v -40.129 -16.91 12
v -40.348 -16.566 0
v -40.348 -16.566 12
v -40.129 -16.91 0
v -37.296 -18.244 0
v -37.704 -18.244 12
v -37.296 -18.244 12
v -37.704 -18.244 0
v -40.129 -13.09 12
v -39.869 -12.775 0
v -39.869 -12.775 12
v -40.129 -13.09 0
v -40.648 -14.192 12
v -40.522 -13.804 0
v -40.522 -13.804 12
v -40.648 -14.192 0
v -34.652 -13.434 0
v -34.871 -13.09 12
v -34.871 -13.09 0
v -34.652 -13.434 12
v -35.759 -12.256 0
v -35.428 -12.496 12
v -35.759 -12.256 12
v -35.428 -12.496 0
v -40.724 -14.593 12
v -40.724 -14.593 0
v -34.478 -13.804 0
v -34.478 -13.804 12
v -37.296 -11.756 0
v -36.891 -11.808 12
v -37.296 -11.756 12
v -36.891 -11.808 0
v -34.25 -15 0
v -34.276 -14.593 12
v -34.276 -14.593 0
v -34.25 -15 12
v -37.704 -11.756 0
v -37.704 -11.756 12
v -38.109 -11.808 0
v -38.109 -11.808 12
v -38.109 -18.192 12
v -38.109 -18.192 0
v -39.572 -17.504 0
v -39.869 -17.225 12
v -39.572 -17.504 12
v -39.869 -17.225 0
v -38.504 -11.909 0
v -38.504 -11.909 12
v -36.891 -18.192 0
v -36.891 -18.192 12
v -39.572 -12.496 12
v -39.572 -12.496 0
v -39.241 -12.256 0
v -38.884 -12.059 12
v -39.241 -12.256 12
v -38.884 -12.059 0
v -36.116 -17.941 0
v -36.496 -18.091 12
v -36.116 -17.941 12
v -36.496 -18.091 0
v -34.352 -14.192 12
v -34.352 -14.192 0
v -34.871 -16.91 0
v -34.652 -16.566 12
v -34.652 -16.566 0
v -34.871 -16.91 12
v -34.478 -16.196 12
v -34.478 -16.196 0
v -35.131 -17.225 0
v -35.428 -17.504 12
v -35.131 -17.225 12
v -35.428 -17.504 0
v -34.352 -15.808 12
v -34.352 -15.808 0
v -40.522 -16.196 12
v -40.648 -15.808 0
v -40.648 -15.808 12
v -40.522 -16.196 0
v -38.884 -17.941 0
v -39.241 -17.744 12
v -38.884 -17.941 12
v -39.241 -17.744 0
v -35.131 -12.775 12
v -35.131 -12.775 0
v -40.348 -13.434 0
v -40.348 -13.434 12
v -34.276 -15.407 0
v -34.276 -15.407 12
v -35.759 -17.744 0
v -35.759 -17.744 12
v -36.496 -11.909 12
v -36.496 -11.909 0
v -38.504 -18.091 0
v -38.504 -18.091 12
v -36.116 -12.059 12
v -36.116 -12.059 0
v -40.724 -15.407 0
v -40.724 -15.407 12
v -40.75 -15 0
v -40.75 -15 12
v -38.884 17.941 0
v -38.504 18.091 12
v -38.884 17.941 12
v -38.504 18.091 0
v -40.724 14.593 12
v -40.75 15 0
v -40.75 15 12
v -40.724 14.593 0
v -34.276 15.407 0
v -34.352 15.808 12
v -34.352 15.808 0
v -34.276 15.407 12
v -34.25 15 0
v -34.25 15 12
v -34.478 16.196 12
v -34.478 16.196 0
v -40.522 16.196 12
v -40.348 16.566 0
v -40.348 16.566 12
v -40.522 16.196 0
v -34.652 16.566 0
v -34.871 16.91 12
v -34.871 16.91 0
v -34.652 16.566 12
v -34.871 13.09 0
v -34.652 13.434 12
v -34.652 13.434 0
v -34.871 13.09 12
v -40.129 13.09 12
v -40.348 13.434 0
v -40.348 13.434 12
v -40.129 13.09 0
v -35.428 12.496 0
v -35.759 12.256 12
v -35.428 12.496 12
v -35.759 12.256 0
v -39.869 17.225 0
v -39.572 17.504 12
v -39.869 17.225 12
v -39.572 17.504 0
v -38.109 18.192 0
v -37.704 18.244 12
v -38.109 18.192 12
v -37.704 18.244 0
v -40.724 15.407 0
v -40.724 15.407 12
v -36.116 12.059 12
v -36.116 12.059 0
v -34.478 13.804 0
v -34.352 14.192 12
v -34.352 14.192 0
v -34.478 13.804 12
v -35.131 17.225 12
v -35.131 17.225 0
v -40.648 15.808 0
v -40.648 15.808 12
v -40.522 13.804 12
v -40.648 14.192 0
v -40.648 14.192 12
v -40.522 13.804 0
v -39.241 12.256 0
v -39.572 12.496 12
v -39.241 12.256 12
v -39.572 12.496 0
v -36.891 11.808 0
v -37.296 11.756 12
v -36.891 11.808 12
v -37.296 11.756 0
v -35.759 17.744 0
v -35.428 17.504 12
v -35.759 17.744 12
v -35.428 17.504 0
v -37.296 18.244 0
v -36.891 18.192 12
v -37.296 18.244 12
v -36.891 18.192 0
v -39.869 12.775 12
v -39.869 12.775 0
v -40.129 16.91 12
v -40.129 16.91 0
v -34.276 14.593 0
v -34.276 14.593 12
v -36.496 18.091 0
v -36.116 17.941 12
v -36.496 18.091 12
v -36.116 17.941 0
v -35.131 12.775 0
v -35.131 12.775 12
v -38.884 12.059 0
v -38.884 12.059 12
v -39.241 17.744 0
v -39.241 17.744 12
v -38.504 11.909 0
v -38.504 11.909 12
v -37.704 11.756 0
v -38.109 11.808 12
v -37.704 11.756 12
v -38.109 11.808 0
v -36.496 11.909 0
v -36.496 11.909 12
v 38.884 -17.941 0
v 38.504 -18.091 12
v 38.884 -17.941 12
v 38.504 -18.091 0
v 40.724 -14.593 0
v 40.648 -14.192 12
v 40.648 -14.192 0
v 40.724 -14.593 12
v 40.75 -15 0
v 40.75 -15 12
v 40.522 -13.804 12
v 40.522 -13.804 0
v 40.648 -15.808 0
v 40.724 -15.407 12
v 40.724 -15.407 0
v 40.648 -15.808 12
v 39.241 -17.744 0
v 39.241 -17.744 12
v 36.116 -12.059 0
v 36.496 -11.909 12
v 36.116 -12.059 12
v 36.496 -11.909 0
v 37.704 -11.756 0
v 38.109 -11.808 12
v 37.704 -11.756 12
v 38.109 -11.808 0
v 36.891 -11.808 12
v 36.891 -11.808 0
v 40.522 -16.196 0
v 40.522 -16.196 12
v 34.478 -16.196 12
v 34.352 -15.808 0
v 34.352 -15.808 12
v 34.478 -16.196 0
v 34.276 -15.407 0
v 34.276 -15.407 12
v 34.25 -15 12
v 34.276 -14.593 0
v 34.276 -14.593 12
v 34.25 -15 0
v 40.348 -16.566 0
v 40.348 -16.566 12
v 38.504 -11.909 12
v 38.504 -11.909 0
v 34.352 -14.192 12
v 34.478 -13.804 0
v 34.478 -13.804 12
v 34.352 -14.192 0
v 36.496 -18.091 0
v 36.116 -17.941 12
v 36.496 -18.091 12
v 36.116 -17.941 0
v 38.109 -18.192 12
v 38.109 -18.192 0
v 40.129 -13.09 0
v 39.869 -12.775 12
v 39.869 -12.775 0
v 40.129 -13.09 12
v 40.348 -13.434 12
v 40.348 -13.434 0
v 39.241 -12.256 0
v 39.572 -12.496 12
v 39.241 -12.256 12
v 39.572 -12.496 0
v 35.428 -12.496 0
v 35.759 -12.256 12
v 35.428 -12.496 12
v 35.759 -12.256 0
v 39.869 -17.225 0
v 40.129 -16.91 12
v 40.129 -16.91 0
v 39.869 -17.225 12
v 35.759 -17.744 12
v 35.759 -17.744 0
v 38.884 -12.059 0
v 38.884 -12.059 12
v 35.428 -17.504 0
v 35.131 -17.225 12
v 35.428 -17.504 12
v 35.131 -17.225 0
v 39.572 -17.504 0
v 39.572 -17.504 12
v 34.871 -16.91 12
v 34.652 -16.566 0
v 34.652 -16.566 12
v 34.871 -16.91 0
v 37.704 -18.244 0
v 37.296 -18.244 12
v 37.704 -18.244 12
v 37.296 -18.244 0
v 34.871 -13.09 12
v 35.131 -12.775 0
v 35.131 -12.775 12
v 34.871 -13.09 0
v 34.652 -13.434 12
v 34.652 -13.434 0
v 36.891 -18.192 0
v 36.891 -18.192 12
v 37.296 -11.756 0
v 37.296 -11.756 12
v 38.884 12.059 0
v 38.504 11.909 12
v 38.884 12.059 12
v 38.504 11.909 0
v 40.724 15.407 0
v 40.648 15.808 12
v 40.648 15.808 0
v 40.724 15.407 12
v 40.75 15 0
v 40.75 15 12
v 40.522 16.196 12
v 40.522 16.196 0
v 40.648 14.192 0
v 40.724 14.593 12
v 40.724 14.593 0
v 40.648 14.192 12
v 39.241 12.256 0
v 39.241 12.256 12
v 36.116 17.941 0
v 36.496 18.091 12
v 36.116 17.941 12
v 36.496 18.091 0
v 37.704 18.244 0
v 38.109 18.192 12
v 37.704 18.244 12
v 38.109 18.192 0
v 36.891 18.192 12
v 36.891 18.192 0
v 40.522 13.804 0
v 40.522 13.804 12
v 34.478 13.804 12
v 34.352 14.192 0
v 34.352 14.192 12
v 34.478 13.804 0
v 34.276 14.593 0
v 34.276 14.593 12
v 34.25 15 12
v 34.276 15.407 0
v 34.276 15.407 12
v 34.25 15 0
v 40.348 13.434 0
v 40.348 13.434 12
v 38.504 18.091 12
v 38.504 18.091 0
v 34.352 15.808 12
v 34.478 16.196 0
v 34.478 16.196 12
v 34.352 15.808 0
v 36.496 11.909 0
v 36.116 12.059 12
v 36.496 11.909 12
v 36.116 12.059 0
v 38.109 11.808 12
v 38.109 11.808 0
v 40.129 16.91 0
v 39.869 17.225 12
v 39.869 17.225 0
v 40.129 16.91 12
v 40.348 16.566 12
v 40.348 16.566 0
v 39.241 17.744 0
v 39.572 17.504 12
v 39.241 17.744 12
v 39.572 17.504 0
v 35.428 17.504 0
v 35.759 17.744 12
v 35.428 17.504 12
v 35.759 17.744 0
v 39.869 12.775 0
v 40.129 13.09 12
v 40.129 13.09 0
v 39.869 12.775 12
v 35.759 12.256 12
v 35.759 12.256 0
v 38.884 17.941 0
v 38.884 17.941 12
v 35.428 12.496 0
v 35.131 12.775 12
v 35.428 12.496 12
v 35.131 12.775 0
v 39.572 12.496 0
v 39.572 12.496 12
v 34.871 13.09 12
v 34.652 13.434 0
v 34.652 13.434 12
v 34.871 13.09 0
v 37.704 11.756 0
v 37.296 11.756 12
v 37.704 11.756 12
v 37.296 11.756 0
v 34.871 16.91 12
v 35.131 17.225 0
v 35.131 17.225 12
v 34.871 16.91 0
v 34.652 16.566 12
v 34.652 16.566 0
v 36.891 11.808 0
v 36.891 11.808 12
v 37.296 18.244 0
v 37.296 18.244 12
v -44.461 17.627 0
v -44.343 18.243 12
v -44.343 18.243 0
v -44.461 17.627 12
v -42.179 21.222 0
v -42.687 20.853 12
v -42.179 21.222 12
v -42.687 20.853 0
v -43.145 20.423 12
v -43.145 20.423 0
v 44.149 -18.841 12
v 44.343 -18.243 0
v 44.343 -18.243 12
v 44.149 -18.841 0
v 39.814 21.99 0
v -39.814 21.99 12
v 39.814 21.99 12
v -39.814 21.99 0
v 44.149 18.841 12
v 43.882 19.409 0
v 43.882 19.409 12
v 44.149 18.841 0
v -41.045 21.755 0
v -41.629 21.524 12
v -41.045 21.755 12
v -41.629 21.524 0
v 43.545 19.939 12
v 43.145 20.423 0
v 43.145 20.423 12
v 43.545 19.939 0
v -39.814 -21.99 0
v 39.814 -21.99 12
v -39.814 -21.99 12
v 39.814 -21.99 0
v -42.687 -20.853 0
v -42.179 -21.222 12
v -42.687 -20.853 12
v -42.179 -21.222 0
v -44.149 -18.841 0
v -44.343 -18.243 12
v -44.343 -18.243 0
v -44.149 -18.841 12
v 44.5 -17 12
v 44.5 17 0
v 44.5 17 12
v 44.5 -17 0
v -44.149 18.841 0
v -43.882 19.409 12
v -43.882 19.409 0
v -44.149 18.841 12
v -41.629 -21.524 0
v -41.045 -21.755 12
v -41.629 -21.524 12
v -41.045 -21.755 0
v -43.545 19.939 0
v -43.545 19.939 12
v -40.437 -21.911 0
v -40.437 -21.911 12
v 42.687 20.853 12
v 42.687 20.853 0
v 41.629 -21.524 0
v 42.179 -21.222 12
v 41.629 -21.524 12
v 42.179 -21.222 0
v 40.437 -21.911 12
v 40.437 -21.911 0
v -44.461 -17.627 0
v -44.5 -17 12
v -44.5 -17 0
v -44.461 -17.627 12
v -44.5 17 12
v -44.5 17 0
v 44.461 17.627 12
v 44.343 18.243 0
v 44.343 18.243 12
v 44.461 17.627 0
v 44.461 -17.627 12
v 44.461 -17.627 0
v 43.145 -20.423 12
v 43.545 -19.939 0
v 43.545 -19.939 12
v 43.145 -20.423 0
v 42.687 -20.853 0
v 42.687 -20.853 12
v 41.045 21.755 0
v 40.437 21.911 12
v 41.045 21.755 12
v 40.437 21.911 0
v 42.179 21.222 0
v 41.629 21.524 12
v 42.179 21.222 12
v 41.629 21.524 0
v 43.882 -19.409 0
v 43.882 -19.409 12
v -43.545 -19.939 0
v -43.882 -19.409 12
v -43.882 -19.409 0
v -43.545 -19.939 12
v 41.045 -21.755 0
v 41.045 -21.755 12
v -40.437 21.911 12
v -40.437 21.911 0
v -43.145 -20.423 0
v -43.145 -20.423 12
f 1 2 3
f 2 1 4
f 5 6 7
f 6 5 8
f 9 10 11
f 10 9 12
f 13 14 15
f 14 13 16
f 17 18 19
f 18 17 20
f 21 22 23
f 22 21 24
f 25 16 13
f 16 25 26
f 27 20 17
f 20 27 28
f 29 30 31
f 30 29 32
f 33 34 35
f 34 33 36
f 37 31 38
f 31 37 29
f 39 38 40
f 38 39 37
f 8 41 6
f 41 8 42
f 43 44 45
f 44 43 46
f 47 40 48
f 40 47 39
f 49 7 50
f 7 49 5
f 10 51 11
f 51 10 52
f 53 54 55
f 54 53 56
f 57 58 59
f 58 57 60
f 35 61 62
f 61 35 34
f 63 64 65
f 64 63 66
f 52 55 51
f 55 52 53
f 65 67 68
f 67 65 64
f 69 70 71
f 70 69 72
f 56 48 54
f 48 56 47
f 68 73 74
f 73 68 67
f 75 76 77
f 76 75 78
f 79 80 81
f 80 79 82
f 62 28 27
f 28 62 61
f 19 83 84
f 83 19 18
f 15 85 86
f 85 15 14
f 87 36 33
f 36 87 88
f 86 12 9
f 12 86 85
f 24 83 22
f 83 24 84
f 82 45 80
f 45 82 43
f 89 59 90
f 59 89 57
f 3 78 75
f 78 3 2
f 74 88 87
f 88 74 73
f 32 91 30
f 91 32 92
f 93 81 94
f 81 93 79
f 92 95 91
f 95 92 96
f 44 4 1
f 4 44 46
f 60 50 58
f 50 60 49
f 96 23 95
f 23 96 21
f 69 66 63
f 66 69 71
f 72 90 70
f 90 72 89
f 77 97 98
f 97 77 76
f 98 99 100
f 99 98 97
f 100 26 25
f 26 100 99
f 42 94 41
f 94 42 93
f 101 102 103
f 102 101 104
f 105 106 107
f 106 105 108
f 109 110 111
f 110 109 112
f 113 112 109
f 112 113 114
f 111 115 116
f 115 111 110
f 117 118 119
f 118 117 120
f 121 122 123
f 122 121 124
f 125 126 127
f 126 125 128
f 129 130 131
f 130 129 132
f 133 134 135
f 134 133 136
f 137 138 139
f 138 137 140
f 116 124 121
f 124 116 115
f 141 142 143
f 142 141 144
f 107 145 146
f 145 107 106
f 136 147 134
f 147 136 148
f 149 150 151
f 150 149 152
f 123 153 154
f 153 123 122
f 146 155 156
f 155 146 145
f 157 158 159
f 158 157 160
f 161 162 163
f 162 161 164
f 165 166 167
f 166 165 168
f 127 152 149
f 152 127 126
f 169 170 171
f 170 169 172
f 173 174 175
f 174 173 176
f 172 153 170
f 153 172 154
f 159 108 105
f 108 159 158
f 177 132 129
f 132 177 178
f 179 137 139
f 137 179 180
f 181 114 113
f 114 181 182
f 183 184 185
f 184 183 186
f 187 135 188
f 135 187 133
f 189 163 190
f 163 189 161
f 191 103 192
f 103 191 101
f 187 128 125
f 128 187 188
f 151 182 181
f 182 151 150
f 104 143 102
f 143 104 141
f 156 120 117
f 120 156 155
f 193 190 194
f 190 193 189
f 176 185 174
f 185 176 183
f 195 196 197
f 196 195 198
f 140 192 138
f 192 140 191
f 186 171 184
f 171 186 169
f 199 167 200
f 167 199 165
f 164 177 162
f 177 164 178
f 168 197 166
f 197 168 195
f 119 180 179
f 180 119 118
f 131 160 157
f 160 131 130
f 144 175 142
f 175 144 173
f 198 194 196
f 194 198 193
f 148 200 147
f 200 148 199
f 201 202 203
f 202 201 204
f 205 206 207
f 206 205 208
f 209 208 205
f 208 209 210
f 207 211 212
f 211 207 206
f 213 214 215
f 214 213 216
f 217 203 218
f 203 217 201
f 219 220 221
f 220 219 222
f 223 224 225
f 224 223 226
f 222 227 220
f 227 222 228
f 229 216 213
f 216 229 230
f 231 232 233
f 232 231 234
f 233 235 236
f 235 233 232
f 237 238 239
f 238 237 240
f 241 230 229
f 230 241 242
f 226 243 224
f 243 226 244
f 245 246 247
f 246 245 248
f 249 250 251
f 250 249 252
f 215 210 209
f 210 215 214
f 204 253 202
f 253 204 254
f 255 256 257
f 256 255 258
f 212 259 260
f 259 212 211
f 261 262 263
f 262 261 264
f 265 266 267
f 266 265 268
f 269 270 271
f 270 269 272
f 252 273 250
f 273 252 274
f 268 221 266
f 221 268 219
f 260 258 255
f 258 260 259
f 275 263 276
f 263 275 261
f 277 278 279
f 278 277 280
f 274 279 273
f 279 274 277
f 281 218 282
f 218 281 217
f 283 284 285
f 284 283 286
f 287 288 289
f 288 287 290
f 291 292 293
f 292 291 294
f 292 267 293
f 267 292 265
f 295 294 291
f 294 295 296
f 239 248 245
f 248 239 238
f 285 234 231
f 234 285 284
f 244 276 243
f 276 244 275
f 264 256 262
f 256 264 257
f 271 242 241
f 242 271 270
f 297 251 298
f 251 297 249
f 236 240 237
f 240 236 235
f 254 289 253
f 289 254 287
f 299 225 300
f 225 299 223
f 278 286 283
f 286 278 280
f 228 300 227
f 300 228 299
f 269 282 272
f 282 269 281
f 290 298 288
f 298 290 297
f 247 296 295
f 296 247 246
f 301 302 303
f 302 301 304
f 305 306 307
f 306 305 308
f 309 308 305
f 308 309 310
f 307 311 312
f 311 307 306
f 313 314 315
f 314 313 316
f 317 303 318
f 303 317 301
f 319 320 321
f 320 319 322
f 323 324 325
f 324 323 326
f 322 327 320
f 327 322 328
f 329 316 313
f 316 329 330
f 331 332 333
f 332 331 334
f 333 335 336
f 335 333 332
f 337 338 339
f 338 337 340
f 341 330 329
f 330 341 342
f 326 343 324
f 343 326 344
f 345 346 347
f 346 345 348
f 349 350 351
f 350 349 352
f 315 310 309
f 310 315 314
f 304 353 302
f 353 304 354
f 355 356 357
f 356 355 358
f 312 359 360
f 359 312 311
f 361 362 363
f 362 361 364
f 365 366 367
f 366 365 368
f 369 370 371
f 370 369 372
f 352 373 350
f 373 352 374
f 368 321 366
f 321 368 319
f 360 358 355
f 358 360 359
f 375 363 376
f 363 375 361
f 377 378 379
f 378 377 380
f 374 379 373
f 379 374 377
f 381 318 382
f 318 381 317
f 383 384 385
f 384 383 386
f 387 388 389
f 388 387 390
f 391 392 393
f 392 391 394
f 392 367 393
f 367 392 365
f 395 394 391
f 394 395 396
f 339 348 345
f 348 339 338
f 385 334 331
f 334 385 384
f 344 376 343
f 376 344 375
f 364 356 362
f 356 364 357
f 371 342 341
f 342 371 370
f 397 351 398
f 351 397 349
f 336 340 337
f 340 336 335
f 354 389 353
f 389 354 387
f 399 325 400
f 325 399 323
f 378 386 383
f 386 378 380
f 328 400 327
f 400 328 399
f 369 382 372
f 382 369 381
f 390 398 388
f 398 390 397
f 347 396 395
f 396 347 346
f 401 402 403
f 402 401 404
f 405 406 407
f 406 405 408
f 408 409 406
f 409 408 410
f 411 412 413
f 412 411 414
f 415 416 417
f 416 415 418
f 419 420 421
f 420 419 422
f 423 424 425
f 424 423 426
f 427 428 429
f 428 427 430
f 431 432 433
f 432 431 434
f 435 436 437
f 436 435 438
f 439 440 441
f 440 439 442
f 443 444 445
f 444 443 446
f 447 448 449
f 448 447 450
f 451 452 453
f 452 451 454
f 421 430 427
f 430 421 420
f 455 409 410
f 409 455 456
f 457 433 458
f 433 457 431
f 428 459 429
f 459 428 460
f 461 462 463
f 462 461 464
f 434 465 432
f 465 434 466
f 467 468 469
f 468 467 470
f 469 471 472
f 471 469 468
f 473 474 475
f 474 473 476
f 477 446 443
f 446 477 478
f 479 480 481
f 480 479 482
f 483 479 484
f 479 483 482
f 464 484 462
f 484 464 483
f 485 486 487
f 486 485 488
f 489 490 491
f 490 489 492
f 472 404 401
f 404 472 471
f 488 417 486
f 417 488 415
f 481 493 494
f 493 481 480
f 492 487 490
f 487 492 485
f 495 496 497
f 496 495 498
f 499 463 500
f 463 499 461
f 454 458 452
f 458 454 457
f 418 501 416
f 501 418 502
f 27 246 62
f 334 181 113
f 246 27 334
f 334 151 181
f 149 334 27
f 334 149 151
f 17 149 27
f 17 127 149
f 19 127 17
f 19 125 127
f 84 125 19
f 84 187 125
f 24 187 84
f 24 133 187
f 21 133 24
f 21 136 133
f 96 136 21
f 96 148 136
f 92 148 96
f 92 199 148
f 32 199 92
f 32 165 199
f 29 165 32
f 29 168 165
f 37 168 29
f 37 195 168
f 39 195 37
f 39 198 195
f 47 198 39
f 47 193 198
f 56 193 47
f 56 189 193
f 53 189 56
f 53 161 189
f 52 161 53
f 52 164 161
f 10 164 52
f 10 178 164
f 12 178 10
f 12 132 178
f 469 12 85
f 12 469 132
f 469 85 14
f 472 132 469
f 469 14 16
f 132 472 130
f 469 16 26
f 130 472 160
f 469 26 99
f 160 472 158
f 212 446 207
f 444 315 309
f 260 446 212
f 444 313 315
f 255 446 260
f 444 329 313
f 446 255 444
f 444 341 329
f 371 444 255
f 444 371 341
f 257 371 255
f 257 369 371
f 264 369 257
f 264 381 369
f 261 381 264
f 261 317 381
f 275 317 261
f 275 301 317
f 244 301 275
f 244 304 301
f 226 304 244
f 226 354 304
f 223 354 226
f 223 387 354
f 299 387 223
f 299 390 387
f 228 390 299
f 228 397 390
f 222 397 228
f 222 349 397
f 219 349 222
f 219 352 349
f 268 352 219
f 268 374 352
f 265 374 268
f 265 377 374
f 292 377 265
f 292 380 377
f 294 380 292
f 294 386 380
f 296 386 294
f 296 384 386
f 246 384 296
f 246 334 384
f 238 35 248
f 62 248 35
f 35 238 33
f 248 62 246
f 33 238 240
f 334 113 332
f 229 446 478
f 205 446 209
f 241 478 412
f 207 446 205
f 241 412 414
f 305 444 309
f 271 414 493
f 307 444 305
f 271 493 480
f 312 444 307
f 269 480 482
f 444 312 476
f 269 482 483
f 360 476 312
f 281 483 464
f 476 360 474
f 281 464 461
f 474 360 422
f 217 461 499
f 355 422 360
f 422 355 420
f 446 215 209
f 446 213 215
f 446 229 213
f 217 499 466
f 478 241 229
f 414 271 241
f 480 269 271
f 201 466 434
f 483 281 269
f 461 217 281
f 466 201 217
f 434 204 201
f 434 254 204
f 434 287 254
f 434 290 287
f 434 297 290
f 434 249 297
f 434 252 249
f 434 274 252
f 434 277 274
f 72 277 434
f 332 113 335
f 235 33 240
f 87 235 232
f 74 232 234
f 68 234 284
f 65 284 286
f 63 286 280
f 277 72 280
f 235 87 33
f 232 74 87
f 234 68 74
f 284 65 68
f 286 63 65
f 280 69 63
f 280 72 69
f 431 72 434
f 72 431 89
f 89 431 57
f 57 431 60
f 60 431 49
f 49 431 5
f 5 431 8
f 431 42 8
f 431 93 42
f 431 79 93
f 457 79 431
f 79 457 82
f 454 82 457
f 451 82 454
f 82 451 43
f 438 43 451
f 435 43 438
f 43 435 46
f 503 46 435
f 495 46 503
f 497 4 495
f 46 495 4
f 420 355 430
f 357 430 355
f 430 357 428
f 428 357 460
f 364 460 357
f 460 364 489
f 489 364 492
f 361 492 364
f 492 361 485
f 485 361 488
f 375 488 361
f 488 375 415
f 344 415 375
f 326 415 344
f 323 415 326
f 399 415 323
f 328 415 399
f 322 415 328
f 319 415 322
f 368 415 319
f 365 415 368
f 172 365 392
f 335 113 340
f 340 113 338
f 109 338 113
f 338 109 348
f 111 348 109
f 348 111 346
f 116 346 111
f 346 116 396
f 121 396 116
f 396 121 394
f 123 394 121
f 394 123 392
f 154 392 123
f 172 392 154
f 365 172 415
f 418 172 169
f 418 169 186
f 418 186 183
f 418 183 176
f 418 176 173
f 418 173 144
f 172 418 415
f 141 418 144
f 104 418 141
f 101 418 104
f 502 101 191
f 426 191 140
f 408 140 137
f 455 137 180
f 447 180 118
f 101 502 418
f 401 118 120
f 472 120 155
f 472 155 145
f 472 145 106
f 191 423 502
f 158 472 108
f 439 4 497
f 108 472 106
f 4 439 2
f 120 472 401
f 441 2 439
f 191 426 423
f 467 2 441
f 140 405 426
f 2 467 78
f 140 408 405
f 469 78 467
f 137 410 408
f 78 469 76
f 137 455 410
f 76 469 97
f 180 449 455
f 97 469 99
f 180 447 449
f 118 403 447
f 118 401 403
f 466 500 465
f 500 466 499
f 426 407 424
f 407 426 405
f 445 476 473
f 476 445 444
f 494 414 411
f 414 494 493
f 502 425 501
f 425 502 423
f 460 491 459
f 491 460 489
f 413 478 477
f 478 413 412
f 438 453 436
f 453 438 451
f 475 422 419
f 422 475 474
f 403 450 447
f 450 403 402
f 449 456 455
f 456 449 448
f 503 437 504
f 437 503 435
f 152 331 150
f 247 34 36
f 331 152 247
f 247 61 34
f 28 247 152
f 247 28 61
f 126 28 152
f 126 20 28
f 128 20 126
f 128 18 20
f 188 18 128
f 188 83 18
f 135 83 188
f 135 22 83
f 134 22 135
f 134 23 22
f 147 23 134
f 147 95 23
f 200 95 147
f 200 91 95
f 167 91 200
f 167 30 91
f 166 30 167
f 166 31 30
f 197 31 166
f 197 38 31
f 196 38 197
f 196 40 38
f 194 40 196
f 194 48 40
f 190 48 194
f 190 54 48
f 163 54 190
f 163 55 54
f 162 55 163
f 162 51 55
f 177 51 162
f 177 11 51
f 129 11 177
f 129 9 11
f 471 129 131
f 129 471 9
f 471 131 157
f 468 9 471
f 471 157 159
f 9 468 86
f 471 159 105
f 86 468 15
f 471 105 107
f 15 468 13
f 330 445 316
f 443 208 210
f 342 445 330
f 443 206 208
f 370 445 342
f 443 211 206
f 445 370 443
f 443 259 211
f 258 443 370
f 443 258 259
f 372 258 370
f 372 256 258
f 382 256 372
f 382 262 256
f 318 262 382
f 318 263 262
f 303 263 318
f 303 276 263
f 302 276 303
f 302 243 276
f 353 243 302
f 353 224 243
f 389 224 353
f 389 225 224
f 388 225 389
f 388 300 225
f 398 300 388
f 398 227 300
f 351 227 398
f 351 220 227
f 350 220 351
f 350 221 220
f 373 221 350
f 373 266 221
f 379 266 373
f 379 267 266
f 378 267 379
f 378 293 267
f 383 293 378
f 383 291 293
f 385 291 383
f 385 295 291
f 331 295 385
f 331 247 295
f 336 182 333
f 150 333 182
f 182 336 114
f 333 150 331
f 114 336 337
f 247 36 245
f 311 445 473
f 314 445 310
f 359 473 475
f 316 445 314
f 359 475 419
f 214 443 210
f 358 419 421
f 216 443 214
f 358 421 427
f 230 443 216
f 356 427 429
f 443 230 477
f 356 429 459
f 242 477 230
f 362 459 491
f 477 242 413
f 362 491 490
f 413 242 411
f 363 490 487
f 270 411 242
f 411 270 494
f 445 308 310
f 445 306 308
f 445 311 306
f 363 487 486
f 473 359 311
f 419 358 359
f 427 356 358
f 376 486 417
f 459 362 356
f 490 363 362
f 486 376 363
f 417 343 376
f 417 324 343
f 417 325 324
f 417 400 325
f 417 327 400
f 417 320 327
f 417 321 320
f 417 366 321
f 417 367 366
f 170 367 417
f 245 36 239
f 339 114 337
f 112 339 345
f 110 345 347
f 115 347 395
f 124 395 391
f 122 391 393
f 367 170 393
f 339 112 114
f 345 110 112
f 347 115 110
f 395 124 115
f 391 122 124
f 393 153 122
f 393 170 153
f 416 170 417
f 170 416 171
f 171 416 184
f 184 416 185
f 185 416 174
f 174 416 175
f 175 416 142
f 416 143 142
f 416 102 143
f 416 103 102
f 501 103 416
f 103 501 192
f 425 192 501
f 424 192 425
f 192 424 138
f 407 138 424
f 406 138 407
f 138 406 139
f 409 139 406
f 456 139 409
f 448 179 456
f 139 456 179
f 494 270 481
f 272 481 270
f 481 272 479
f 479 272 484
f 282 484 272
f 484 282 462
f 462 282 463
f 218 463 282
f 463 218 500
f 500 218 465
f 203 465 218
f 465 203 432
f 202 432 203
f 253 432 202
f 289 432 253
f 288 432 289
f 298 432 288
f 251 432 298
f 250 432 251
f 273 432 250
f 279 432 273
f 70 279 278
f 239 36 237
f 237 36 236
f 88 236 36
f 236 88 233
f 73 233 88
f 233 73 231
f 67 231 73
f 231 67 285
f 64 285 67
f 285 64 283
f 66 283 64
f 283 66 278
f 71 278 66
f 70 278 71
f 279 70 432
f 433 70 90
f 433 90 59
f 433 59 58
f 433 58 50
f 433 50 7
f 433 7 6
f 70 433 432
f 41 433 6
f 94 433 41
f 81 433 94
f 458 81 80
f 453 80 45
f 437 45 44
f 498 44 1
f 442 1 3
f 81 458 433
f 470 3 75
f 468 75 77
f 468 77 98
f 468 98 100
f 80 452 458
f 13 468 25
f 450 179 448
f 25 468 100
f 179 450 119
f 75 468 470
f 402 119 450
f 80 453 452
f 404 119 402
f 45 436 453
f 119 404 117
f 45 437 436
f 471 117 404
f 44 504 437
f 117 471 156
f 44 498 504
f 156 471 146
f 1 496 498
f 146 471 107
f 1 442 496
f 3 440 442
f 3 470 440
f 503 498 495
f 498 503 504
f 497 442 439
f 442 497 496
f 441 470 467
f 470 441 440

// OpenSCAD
$fn = 50;


difference() {
	union() {
		hull() {
			translate(v = [-39.5000000000, 17.0000000000, 0]) {
				cylinder(h = 12, r = 5);
			}
			translate(v = [39.5000000000, 17.0000000000, 0]) {
				cylinder(h = 12, r = 5);
			}
			translate(v = [-39.5000000000, -17.0000000000, 0]) {
				cylinder(h = 12, r = 5);
			}
			translate(v = [39.5000000000, -17.0000000000, 0]) {
				cylinder(h = 12, r = 5);
			}
		}
	}
	union() {
		translate(v = [-37.5000000000, -15.0000000000, -100.0000000000]) {
			cylinder(h = 200, r = 3.2500000000);
		}
		translate(v = [-37.5000000000, 15.0000000000, -100.0000000000]) {
			cylinder(h = 200, r = 3.2500000000);
		}
		translate(v = [37.5000000000, -15.0000000000, -100.0000000000]) {
			cylinder(h = 200, r = 3.2500000000);
		}
		translate(v = [37.5000000000, 15.0000000000, -100.0000000000]) {
			cylinder(h = 200, r = 3.2500000000);
		}
	}
}
